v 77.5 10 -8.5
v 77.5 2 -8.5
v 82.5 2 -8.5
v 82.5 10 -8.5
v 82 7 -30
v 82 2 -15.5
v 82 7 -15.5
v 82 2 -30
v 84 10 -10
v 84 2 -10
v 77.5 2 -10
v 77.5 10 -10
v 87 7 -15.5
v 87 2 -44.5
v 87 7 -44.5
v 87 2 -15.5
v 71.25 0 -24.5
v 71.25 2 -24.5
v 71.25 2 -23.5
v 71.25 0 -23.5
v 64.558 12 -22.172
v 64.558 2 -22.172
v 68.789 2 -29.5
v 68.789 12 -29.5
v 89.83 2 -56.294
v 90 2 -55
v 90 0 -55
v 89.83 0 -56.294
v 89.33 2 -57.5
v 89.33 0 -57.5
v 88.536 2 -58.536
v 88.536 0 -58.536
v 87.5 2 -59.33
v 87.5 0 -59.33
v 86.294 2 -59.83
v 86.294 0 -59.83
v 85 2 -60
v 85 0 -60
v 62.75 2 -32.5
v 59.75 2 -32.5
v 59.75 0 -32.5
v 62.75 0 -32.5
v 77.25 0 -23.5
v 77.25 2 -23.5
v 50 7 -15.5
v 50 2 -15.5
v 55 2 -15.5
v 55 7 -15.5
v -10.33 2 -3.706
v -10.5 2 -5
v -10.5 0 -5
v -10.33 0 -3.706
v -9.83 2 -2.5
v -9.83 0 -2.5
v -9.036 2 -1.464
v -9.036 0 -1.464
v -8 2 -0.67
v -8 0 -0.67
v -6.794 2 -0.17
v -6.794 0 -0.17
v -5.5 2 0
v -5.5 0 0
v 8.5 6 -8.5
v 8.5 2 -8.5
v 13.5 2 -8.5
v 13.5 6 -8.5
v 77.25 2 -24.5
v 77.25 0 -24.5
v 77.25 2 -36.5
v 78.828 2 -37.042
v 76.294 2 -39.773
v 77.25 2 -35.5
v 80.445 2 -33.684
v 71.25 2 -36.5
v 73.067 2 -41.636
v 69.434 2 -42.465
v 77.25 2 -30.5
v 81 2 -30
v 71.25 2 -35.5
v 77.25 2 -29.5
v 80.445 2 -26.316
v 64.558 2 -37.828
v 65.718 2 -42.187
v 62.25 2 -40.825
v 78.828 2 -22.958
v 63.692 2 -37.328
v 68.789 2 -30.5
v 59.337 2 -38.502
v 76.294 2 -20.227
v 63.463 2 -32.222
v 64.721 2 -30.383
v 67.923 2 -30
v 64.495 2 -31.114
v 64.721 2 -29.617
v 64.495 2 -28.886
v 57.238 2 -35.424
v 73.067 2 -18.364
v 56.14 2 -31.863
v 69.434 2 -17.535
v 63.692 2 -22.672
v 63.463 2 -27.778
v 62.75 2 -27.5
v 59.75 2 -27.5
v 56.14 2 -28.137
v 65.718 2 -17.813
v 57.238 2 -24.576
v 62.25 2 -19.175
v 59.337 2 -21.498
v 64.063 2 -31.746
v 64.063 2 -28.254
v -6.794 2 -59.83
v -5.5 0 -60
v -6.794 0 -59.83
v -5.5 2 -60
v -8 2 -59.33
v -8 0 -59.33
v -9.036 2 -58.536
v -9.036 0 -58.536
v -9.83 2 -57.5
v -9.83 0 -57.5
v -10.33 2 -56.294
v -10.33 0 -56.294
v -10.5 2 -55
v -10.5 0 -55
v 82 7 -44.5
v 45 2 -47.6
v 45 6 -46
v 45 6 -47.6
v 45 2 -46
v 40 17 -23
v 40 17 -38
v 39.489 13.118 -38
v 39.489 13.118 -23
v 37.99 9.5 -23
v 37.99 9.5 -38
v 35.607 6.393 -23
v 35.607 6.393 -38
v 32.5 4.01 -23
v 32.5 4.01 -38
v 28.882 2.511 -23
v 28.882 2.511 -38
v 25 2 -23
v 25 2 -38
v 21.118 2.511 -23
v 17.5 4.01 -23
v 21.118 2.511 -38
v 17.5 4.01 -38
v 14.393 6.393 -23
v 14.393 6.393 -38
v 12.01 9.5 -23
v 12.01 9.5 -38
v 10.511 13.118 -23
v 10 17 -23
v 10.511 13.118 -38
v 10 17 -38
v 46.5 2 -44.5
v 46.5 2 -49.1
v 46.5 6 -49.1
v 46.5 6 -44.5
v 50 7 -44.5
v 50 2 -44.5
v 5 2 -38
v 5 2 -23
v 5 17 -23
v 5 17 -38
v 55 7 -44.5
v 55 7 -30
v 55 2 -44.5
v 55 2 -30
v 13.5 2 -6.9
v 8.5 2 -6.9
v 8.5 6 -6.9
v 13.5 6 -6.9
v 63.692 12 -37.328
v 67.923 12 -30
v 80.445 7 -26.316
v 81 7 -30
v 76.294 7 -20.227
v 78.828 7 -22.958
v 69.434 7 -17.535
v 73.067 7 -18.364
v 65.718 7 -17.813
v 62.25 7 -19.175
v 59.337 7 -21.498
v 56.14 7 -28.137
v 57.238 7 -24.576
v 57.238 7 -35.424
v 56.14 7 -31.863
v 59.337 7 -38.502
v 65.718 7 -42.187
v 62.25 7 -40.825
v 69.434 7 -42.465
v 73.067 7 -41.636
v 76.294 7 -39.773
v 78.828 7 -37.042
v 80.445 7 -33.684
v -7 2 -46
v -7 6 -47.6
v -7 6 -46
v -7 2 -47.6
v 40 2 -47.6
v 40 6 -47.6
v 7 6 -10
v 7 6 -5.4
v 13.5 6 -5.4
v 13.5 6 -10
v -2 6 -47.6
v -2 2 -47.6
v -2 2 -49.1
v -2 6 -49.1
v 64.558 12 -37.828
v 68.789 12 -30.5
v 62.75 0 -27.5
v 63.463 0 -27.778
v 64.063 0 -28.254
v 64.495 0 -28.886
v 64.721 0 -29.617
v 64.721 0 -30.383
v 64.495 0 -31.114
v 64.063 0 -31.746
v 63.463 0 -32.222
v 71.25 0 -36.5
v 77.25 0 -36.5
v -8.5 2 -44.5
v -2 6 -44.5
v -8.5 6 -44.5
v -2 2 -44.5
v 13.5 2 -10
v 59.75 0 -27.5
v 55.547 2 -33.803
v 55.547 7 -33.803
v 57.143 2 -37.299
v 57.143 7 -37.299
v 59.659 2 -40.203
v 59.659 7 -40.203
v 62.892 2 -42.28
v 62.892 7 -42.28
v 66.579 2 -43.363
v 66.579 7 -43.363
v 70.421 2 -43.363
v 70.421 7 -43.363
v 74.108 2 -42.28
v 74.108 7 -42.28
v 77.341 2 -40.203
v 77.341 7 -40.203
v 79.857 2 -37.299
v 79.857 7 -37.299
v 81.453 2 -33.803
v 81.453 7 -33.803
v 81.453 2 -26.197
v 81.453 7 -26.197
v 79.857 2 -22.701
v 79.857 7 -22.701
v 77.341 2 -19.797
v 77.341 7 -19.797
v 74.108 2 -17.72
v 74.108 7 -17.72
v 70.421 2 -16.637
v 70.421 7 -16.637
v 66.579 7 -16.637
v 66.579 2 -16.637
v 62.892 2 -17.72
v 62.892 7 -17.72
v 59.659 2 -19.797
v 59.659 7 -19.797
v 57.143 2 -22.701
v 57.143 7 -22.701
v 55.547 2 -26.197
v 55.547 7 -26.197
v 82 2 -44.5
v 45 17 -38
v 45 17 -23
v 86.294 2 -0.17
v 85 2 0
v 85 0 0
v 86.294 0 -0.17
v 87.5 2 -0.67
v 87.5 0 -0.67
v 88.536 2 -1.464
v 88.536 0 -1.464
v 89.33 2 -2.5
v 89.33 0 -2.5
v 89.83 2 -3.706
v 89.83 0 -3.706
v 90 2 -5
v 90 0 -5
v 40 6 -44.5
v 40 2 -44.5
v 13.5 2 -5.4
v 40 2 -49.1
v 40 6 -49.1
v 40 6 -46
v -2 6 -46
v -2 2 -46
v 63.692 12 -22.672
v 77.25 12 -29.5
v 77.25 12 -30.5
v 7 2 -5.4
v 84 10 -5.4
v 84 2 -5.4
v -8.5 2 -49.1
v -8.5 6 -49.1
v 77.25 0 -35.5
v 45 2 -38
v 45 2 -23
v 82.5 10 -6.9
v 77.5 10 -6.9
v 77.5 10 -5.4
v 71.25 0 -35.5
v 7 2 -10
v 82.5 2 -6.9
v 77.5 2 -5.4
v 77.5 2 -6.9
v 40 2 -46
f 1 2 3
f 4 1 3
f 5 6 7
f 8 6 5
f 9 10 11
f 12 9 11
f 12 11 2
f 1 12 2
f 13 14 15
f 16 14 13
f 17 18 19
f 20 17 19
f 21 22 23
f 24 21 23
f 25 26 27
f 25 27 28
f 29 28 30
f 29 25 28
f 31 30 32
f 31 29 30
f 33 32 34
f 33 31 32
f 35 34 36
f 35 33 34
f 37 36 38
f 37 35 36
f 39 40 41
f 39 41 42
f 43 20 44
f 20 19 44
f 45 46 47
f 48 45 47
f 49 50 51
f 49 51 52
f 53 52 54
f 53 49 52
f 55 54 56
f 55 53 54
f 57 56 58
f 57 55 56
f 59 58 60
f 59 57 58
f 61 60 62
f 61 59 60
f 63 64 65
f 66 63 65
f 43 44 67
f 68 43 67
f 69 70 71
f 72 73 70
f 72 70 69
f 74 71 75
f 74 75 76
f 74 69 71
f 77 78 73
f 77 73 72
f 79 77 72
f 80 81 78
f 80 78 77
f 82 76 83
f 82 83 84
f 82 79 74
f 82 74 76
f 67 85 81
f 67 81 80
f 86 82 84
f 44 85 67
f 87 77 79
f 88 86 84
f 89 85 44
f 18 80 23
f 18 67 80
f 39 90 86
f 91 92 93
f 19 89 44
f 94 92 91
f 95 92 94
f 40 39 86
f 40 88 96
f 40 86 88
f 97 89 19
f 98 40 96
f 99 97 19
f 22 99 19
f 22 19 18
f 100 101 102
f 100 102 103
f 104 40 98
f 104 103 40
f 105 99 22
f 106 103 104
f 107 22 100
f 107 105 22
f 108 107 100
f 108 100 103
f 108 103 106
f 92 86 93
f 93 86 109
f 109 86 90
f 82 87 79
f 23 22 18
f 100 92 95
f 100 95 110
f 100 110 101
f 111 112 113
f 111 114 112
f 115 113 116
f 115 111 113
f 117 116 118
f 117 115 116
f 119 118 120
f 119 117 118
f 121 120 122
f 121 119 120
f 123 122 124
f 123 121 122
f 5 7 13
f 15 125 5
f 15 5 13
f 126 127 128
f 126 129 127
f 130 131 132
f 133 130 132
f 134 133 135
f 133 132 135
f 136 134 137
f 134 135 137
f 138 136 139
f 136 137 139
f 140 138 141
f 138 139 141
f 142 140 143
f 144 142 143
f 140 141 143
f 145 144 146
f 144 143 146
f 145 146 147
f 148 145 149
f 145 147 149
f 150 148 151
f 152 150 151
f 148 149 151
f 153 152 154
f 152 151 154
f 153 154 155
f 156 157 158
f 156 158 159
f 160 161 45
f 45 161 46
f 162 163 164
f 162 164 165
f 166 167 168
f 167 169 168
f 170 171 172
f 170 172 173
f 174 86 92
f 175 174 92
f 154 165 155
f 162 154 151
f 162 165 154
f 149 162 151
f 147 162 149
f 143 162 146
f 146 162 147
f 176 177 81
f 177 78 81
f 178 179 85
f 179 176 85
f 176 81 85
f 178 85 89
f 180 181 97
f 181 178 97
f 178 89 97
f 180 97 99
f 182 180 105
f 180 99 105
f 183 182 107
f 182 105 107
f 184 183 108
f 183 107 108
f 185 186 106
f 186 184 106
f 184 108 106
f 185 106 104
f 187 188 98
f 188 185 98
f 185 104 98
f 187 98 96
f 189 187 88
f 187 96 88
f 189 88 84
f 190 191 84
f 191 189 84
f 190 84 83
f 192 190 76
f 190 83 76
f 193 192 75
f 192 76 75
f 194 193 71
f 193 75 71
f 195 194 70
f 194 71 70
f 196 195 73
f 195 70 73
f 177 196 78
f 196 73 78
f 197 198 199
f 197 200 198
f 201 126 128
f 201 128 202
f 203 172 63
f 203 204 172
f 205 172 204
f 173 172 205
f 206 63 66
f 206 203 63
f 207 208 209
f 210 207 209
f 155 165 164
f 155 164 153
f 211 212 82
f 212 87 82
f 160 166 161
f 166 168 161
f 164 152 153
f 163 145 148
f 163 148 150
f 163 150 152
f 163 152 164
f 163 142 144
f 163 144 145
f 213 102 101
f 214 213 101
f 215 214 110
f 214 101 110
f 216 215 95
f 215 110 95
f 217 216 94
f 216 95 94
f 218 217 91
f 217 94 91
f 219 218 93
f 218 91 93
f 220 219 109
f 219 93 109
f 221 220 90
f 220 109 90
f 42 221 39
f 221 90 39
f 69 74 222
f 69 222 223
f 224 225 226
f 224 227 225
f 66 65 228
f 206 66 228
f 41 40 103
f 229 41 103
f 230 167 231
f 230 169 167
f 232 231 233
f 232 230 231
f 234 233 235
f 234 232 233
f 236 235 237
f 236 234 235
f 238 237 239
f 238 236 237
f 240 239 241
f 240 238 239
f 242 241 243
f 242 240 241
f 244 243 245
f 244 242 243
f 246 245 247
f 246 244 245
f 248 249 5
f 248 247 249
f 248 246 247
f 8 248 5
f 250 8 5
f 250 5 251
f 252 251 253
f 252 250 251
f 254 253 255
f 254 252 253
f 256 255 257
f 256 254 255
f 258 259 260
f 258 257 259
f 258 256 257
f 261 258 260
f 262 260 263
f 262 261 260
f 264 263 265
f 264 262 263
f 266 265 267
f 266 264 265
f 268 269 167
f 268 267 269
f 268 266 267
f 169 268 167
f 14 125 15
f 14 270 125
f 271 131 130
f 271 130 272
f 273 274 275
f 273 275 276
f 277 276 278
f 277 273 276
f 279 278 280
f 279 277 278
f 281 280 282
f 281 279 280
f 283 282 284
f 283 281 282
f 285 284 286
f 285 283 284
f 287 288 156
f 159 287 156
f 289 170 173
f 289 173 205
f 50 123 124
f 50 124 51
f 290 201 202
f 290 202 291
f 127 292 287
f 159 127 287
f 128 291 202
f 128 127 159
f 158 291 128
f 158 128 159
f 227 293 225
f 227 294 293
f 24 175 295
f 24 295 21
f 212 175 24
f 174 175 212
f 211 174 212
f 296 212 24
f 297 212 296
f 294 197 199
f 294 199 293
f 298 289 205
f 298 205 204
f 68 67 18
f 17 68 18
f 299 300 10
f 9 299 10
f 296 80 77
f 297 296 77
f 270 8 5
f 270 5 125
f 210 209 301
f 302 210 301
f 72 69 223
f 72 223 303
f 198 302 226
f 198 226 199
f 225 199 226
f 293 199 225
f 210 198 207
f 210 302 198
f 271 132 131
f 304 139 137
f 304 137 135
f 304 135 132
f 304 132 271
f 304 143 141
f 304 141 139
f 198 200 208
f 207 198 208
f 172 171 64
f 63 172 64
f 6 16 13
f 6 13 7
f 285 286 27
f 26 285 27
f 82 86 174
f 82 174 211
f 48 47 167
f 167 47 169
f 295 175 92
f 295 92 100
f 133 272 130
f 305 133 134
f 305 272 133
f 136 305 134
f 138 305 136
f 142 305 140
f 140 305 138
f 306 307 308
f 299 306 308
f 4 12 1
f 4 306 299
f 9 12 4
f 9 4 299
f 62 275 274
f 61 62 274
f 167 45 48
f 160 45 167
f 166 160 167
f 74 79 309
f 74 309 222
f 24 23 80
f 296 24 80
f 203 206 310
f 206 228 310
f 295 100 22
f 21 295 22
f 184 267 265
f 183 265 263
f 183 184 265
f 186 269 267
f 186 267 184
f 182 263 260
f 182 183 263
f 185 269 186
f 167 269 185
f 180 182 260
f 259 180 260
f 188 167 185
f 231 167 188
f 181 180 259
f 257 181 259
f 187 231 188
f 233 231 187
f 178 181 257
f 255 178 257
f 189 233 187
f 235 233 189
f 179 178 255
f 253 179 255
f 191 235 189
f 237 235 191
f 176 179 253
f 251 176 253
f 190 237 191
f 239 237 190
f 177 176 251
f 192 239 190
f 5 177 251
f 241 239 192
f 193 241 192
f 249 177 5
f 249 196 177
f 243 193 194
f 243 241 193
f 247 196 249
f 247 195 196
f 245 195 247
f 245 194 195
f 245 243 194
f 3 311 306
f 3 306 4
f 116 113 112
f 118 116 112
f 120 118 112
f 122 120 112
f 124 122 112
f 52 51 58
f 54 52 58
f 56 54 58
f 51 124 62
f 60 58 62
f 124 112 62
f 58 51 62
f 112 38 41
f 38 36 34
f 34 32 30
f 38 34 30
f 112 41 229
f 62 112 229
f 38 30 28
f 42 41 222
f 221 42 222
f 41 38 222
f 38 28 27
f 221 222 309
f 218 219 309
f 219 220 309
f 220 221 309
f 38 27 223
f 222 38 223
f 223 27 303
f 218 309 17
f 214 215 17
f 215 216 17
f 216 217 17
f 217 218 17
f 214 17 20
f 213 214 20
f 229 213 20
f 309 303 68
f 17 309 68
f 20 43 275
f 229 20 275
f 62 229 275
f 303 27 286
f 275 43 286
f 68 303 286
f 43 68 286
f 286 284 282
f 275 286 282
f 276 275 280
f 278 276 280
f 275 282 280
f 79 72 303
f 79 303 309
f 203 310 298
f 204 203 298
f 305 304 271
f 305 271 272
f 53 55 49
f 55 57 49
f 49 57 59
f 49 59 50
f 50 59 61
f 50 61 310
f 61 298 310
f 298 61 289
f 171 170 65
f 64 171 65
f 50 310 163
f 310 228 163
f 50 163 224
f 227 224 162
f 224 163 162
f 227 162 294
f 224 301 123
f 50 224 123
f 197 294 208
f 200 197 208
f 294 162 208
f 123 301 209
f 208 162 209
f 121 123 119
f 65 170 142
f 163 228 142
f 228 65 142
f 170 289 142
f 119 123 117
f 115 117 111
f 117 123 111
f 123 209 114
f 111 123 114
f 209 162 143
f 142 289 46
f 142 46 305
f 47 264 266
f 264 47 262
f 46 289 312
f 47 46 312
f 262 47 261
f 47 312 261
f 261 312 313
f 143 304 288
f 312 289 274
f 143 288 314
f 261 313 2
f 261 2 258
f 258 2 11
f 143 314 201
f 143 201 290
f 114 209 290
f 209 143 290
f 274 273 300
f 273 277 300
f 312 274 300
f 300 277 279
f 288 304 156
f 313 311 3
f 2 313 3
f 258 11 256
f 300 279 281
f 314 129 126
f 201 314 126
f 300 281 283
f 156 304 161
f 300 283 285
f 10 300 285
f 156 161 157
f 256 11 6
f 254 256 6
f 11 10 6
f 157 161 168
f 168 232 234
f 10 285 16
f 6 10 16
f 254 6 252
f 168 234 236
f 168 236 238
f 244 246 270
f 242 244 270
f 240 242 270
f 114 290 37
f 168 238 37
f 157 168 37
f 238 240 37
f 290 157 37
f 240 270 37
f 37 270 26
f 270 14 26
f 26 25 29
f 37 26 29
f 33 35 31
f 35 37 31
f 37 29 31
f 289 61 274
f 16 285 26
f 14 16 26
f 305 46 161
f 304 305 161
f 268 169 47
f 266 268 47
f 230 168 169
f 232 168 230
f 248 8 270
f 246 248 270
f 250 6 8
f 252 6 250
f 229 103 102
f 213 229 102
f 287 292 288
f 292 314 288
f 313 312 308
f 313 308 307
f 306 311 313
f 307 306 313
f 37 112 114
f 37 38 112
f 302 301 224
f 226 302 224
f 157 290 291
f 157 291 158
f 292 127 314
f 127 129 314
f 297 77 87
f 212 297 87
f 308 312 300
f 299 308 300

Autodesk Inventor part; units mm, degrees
ref_plane "YZ Plane" through (0, 0, 0) normal (1, 0, 0) x (0, 1, 0)
ref_plane "XZ Plane" through (0, 0, 0) normal (0, 1, 0) x (-1, 0, 0)
ref_plane "XY Plane" through (0, 0, 0) normal (0, 0, 1) x (1, 0, 0)
sketch "Sketch1" plane through (0, 0, 0) normal (0, 1, 0) x (-1, 0, 0)
  line L0 (0, 0) -> (-90, 0)
  line L1 (-90, 0) -> (-90, -60)
  line L2 (-90, -60) -> (0, -60)
  line L3 (0, -60) -> (0, 0)
  dimension "d0" = 90
  dimension "d1" = 60
extrude "Extrusion1" add sketch "Sketch1" along normal blind 2
sketch "Sketch2" plane through (0, 2, 0) normal (0, 1, 0) x (1, 0, 0)
  line L0 (90, 0) -> (90, 60) construction
  line L1 (90, 60) -> (77.25, 60) construction
  line L2 (90, 60) -> (0, 60) construction
  line L3 (77.25, 60) -> (77.25, 0) construction
  line L4 (0, 0) -> (90, 0) construction
  line L5 (77.25, 30) -> (77.25, 35.5) construction
  line L6 (77.25, 35.5) -> (77.25, 30) construction
  line L7 (77.25, 30) -> (77.25, 24.5) construction
  line L8 (77.25, 24.5) -> (71.25, 24.5)
  line L9 (71.25, 24.5) -> (71.25, 23.5)
  line L10 (71.25, 23.5) -> (77.25, 23.5)
  line L11 (77.25, 23.5) -> (77.25, 24.5)
  line L12 (77.25, 35.5) -> (71.25, 35.5)
  line L13 (71.25, 35.5) -> (71.25, 36.5)
  line L14 (71.25, 36.5) -> (77.25, 36.5)
  line L15 (77.25, 36.5) -> (77.25, 35.5)
  dimension "d4" = 12.75
  dimension "d5" = 5.5
  dimension "d6" = 5.5
  dimension "d7" = 6
  dimension "d8" = 1
  dimension "d9" = 1
extrude "Extrusion2" cut sketch "Sketch2" against normal through all
sketch "Sketch3" plane through (0, 2, 0) normal (0, 1, 0) x (1, 0, 0)
  line L0 (77.25, 35.5) -> (71.25, 35.5) construction
  line L1 (77.25, 24.5) -> (71.25, 24.5) construction
  line L2 (71.25, 35.5) -> (71.25, 24.5) construction
  line L3 (71.25, 30) -> (64.75, 30) construction
  line L4 (64.75, 30) -> (64.75, 32.5) construction
  line L5 (64.75, 32.5) -> (59.75, 32.5) construction
  line L6 (59.75, 32.5) -> (59.75, 27.5) construction
  line L7 (59.75, 27.5) -> (64.75, 27.5) construction
  line L8 (64.75, 27.5) -> (64.75, 32.5) construction
  line L9 (59.75, 27.5) -> (62.75, 27.5) construction
  line L10 (59.75, 32.5) -> (62.75, 32.5) construction
  arc A0 (62.75, 27.5) -> (62.75, 32.5) centre (62.1875, 30) ccw
  line L11 (62.75, 32.5) -> (59.75, 32.5) construction
  line L12 (59.75, 32.5) -> (59.75, 27.5) construction
  line L13 (59.75, 32.5) -> (62.75, 32.5)
  line L14 (59.75, 32.5) -> (59.75, 27.5)
  line L15 (59.75, 27.5) -> (62.75, 27.5)
  point P0 (0, 0)
  dimension "d12" = 6.5
  dimension "d15" = 2.5
  dimension "d16" = 5
  dimension "d17" = 5
  dimension "d18" = 3
  dimension "d19" = 3
extrude "Extrusion3" cut sketch "Sketch3" against normal through all
sketch "Sketch20" plane through (0, 2, 0) normal (0, 1, 0) x (1, 0, 0)
  line L0 (77.25, 36.5) -> (77.25, 35.5) construction
  line L1 (77.25, 36.5) -> (59.75, 36.5) construction
  line L2 (59.75, 23.5) -> (77.25, 23.5) construction
  line L3 (77.25, 23.5) -> (77.25, 36.5) construction
  line L4 (68.5, 30) -> (77.25, 30) construction
  line L5 (68.5, 30) -> (68.5, 29.5) construction
  line L6 (68.5, 29.5) -> (77.25, 29.5)
  line L7 (77.25, 29.5) -> (77.25, 30.5)
  line L8 (77.25, 30.5) -> (68.5, 30.5)
  line L9 (68.5, 30.5) -> (68.5, 29.5)
  line L10 (68.933, 30.25) -> (64.558, 37.8277)
  line L11 (63.692, 37.3277) -> (68.067, 29.75)
  line L12 (68.067, 29.75) -> (68.933, 30.25)
  line L13 (69.7542, 40.8277) -> (58.4958, 34.3277) construction
  line L14 (68.067, 30.25) -> (63.692, 22.6723)
  line L15 (64.558, 22.1723) -> (68.933, 29.75)
  line L16 (68.933, 29.75) -> (68.067, 30.25)
  line L17 (58.4958, 25.6723) -> (69.7542, 19.1723) construction
  line L18 (63.692, 37.3277) -> (64.558, 37.8277)
  line L19 (63.692, 22.6723) -> (64.558, 22.1723)
  point P0 (0, 0)
  point P1 (64.125, 37.5777)
  point P2 (64.125, 22.4223)
  dimension "d143" = 13
  dimension "d144" = 0.5
  dimension "d145" = 1
  dimension "d148" = 360
extrude "Extrusion17" add sketch "Sketch20" along normal blind 10
sketch "Sketch21" plane through (0, 2, 0) normal (0, 1, 0) x (1, 0, 0)
  line L0 (77.25, 24.5) -> (77.25, 23.5) construction
  line L1 (77.25, 23.5) -> (59.75, 23.5) construction
  line L2 (59.75, 23.5) -> (59.75, 36.5) construction
  line L3 (59.75, 36.5) -> (77.25, 36.5) construction
  line L4 (77.25, 36.5) -> (77.25, 23.5) construction
  circle A0 centre (68.5, 30) radius 12.5
  circle A1 centre (68.5, 30) radius 13.5
  point P0 (0, 0)
  dimension "d154" = 13
  dimension "d155" = 25
  dimension "d156" = 27
extrude "Extrusion18" add sketch "Sketch21" along normal blind 5
sketch "Sketch23" plane through (0, 2, 0) normal (0, 1, 0) x (1, 0, 0)
  line L0 (90, 0) -> (90, 60) construction
  line L1 (90, 30) -> (87, 30) construction
  line L2 (87, 30) -> (87, 18.5) construction
  line L3 (87, 18.5) -> (50, 18.5) construction
  line L4 (50, 18.5) -> (50, 41.5) construction
  line L5 (50, 41.5) -> (87, 41.5) construction
  line L6 (87, 41.5) -> (87, 18.5) construction
  line L7 (87, 18.5) -> (87, 15.5) construction
  line L8 (87, 15.5) -> (82, 15.5) construction
  line L9 (87, 15.5) -> (82, 15.5)
  line L10 (82, 15.5) -> (82, 44.5)
  line L11 (82, 44.5) -> (87, 44.5)
  line L12 (87, 44.5) -> (87, 15.5)
  line L13 (50, 18.5) -> (50, 15.5) construction
  line L14 (50, 15.5) -> (55, 15.5)
  line L15 (55, 15.5) -> (55, 44.5)
  line L16 (55, 44.5) -> (50, 44.5)
  line L17 (50, 44.5) -> (50, 15.5)
  point P0 (0, 0)
  dimension "d164" = 3
  dimension "d165" = 11.5
  dimension "d166" = 37
  dimension "d167" = 23
  dimension "d168" = 3
  dimension "d169" = 5
  dimension "d170" = 5
  dimension "d171" = 29
  dimension "d172" = 3
  dimension "d173" = 5
  dimension "d174" = 29
extrude "Extrusion19" add sketch "Sketch23" along normal blind 5
sketch "Sketch24" plane through (0, 2, 0) normal (0, 1, 0) x (1, 0, 0)
  line L0 (84, 8.5) -> (82.5, 8.5) construction
  line L1 (82.5, 8.5) -> (8.5, 8.5) construction
  line L2 (8.5, 8.5) -> (8.5, 6.9) construction
  line L3 (8.5, 6.9) -> (82.5, 6.9) construction
  line L4 (82.5, 6.9) -> (82.5, 8.5) construction
  line L5 (82.5, 6.9) -> (77.5, 6.9)
  line L6 (77.5, 6.9) -> (77.5, 5.4)
  line L7 (77.5, 5.4) -> (84, 5.4)
  line L8 (82.5, 6.9) -> (82.5, 8.5)
  line L9 (82.5, 8.5) -> (77.5, 8.5)
  line L10 (77.5, 8.5) -> (77.5, 10)
  line L11 (8.5, 6.9) -> (13.5, 6.9)
  line L12 (13.5, 6.9) -> (13.5, 5.4)
  line L13 (13.5, 5.4) -> (7, 5.4)
  line L14 (8.5, 8.5) -> (13.5, 8.5)
  line L15 (13.5, 8.5) -> (13.5, 10)
  line L16 (13.5, 10) -> (7, 10)
  line L17 (7, 10) -> (7, 5.4)
  line L18 (8.5, 6.9) -> (8.5, 8.5)
  line L19 (77.5, 10) -> (84, 10)
  line L20 (84, 5.4) -> (84, 10)
  line L21 (84, 8.5) -> (90, 8.5) construction
  line L22 (90, 0) -> (90, 60) construction
  line L23 (87, 44.5) -> (87, 15.5) construction
  line L24 (87, 15.5) -> (90, 15.5) construction
  line L25 (90, 8.5) -> (90, 15.5) construction
  point P0 (0, 0)
  dimension "d178" = 1.5
  dimension "d179" = 74
  dimension "d180" = 1.6
  dimension "d181" = 5
  dimension "d182" = 1.5
  dimension "d183" = 5
  dimension "d184" = 1.5
  dimension "d185" = 5
  dimension "d186" = 1.5
  dimension "d187" = 6.5
  dimension "d188" = 5
  dimension "d189" = 1.5
  dimension "d230" = 6
  dimension "d231" = 7
extrude "Extrusion20" add sketch "Sketch24" along normal blind 4
sketch "Sketch25" plane through (0, 6, 0) normal (0, 1, 0) x (1, 0, 0)
  line L0 (84, 5.4) -> (84, 10) projected
  line L1 (77.5, 5.4) -> (84, 5.4)
  line L2 (84, 5.4) -> (84, 10)
  line L3 (84, 10) -> (77.5, 10) projected
  line L4 (84, 10) -> (77.5, 10)
  line L5 (77.5, 10) -> (77.5, 8.5) projected
  line L6 (77.5, 10) -> (77.5, 8.5)
  line L7 (77.5, 8.5) -> (82.5, 8.5) projected
  line L8 (77.5, 8.5) -> (82.5, 8.5)
  line L9 (82.5, 6.9) -> (82.5, 8.5) projected
  line L10 (82.5, 8.5) -> (82.5, 6.9)
  line L11 (82.5, 6.9) -> (77.5, 6.9)
  line L12 (77.5, 5.4) -> (77.5, 6.9)
  point P0 (0, 0)
extrude "Extrusion21" add sketch "Sketch25" along normal blind 4
sketch "Sketch26" plane through (0, 2, 0) normal (0, 1, 0) x (1, 0, 0)
  line L0 (50, 15.5) -> (55, 15.5) projected
  line L1 (45, 23) -> (5, 23)
  line L2 (5, 23) -> (5, 38)
  line L3 (5, 38) -> (45, 38)
  line L4 (45, 38) -> (45, 23)
  line L5 (50, 15.5) -> (50, 0) construction
  line L6 (50, 0) -> (45, 0) construction
  line L7 (0, 0) -> (90, 0) construction
  line L8 (45, 23) -> (45, 0) construction
  dimension "d195" = 40
  dimension "d196" = 15
  dimension "d229" = 23
extrude "Extrusion22" add sketch "Sketch26" along normal blind 15
sketch "Sketch27" plane through (45, 2, -38) normal (0, 0, -1) x (-1, 0, 0)
  line L0 (40, 15) -> (0, 15) projected
  circle A0 centre (20, 15) radius 15
  point P0 (45, -2)
  dimension "d199" = 30
extrude "Extrusion23" cut sketch "Sketch27" against normal blind 15
sketch "Sketch29" plane through (0, 2, 0) normal (0, 1, 0) x (1, 0, 0)
  line L0 (25, 38) -> (45, 38) projected
  line L1 (45, 38) -> (45, 46) construction
  line L2 (45, 46) -> (-7, 46) construction
  line L3 (-7, 46) -> (-7, 47.6) construction
  line L4 (-7, 47.6) -> (45, 47.6) construction
  line L5 (45, 47.6) -> (45, 46) construction
  line L6 (45, 46) -> (40, 46)
  line L7 (40, 46) -> (40, 44.5)
  line L8 (40, 44.5) -> (46.5, 44.5)
  line L9 (45, 46) -> (45, 47.6)
  line L10 (45, 47.6) -> (40, 47.6)
  line L11 (40, 47.6) -> (40, 49.1)
  line L12 (40, 49.1) -> (46.5, 49.1)
  line L13 (46.5, 49.1) -> (46.5, 44.5)
  line L14 (-7, 47.6) -> (-7, 46)
  line L15 (-7, 46) -> (-2, 46)
  line L16 (-2, 46) -> (-2, 44.5)
  line L17 (-2, 44.5) -> (-8.5, 44.5)
  line L18 (-7, 47.6) -> (-2, 47.6)
  line L19 (-2, 47.6) -> (-2, 49.1)
  line L20 (-2, 49.1) -> (-8.5, 49.1)
  line L21 (-8.5, 49.1) -> (-8.5, 44.5)
  point P0 (0, 0)
  dimension "d215" = 8
  dimension "d216" = 52
  dimension "d217" = 1.6
  dimension "d218" = 5
  dimension "d219" = 1.5
  dimension "d220" = 6.5
  dimension "d221" = 1.5
  dimension "d222" = 5
  dimension "d223" = 6.5
  dimension "d224" = 6.5
extrude "Extrusion25" add sketch "Sketch29" along normal blind 4
sketch "Sketch30" plane through (0, 0, -60) normal (-1, 0, 0) x (0, 0, 1)
  line L0 (0, 0) -> (0, 2) projected
  line L1 (60, 0) -> (60, 2) projected
  line L2 (0, 0) -> (60, 0)
  line L3 (60, 0) -> (60, 2)
  line L4 (60, 2) -> (0, 2)
  line L5 (0, 2) -> (0, 0)
extrude "Extrusion26" add sketch "Sketch30" along normal blind 10.5
sketch "Sketch31" plane through (0, 2, 0) normal (0, 1, 0) x (1, 0, 0)
  arc A0 (90, 55) -> (85, 60) centre (85, 55) ccw
  arc A1 (-10.5, 5) -> (-5.5, 0) centre (-5.5, 5) ccw
  arc A2 (-5.5, 60) -> (-10.5, 55) centre (-5.5, 55) ccw
  arc A3 (85, 0) -> (90, 5) centre (85, 5) ccw
  line L0 (90, 0) -> (85, 0)
  line L1 (90, 0) -> (90, 5)
  line L2 (-5.5, 0) -> (-10.5, 0)
  line L3 (-10.5, 55) -> (-10.5, 60)
  line L4 (-10.5, 60) -> (-5.5, 60)
  line L5 (85, 60) -> (90, 60)
  line L6 (90, 60) -> (90, 55)
  line L7 (-10.5, 0) -> (-10.5, 5)
  point P0 (0, 0)
  dimension "d232" = 5
extrude "Extrusion27" cut sketch "Sketch31" against normal through all
properties part number "base"
